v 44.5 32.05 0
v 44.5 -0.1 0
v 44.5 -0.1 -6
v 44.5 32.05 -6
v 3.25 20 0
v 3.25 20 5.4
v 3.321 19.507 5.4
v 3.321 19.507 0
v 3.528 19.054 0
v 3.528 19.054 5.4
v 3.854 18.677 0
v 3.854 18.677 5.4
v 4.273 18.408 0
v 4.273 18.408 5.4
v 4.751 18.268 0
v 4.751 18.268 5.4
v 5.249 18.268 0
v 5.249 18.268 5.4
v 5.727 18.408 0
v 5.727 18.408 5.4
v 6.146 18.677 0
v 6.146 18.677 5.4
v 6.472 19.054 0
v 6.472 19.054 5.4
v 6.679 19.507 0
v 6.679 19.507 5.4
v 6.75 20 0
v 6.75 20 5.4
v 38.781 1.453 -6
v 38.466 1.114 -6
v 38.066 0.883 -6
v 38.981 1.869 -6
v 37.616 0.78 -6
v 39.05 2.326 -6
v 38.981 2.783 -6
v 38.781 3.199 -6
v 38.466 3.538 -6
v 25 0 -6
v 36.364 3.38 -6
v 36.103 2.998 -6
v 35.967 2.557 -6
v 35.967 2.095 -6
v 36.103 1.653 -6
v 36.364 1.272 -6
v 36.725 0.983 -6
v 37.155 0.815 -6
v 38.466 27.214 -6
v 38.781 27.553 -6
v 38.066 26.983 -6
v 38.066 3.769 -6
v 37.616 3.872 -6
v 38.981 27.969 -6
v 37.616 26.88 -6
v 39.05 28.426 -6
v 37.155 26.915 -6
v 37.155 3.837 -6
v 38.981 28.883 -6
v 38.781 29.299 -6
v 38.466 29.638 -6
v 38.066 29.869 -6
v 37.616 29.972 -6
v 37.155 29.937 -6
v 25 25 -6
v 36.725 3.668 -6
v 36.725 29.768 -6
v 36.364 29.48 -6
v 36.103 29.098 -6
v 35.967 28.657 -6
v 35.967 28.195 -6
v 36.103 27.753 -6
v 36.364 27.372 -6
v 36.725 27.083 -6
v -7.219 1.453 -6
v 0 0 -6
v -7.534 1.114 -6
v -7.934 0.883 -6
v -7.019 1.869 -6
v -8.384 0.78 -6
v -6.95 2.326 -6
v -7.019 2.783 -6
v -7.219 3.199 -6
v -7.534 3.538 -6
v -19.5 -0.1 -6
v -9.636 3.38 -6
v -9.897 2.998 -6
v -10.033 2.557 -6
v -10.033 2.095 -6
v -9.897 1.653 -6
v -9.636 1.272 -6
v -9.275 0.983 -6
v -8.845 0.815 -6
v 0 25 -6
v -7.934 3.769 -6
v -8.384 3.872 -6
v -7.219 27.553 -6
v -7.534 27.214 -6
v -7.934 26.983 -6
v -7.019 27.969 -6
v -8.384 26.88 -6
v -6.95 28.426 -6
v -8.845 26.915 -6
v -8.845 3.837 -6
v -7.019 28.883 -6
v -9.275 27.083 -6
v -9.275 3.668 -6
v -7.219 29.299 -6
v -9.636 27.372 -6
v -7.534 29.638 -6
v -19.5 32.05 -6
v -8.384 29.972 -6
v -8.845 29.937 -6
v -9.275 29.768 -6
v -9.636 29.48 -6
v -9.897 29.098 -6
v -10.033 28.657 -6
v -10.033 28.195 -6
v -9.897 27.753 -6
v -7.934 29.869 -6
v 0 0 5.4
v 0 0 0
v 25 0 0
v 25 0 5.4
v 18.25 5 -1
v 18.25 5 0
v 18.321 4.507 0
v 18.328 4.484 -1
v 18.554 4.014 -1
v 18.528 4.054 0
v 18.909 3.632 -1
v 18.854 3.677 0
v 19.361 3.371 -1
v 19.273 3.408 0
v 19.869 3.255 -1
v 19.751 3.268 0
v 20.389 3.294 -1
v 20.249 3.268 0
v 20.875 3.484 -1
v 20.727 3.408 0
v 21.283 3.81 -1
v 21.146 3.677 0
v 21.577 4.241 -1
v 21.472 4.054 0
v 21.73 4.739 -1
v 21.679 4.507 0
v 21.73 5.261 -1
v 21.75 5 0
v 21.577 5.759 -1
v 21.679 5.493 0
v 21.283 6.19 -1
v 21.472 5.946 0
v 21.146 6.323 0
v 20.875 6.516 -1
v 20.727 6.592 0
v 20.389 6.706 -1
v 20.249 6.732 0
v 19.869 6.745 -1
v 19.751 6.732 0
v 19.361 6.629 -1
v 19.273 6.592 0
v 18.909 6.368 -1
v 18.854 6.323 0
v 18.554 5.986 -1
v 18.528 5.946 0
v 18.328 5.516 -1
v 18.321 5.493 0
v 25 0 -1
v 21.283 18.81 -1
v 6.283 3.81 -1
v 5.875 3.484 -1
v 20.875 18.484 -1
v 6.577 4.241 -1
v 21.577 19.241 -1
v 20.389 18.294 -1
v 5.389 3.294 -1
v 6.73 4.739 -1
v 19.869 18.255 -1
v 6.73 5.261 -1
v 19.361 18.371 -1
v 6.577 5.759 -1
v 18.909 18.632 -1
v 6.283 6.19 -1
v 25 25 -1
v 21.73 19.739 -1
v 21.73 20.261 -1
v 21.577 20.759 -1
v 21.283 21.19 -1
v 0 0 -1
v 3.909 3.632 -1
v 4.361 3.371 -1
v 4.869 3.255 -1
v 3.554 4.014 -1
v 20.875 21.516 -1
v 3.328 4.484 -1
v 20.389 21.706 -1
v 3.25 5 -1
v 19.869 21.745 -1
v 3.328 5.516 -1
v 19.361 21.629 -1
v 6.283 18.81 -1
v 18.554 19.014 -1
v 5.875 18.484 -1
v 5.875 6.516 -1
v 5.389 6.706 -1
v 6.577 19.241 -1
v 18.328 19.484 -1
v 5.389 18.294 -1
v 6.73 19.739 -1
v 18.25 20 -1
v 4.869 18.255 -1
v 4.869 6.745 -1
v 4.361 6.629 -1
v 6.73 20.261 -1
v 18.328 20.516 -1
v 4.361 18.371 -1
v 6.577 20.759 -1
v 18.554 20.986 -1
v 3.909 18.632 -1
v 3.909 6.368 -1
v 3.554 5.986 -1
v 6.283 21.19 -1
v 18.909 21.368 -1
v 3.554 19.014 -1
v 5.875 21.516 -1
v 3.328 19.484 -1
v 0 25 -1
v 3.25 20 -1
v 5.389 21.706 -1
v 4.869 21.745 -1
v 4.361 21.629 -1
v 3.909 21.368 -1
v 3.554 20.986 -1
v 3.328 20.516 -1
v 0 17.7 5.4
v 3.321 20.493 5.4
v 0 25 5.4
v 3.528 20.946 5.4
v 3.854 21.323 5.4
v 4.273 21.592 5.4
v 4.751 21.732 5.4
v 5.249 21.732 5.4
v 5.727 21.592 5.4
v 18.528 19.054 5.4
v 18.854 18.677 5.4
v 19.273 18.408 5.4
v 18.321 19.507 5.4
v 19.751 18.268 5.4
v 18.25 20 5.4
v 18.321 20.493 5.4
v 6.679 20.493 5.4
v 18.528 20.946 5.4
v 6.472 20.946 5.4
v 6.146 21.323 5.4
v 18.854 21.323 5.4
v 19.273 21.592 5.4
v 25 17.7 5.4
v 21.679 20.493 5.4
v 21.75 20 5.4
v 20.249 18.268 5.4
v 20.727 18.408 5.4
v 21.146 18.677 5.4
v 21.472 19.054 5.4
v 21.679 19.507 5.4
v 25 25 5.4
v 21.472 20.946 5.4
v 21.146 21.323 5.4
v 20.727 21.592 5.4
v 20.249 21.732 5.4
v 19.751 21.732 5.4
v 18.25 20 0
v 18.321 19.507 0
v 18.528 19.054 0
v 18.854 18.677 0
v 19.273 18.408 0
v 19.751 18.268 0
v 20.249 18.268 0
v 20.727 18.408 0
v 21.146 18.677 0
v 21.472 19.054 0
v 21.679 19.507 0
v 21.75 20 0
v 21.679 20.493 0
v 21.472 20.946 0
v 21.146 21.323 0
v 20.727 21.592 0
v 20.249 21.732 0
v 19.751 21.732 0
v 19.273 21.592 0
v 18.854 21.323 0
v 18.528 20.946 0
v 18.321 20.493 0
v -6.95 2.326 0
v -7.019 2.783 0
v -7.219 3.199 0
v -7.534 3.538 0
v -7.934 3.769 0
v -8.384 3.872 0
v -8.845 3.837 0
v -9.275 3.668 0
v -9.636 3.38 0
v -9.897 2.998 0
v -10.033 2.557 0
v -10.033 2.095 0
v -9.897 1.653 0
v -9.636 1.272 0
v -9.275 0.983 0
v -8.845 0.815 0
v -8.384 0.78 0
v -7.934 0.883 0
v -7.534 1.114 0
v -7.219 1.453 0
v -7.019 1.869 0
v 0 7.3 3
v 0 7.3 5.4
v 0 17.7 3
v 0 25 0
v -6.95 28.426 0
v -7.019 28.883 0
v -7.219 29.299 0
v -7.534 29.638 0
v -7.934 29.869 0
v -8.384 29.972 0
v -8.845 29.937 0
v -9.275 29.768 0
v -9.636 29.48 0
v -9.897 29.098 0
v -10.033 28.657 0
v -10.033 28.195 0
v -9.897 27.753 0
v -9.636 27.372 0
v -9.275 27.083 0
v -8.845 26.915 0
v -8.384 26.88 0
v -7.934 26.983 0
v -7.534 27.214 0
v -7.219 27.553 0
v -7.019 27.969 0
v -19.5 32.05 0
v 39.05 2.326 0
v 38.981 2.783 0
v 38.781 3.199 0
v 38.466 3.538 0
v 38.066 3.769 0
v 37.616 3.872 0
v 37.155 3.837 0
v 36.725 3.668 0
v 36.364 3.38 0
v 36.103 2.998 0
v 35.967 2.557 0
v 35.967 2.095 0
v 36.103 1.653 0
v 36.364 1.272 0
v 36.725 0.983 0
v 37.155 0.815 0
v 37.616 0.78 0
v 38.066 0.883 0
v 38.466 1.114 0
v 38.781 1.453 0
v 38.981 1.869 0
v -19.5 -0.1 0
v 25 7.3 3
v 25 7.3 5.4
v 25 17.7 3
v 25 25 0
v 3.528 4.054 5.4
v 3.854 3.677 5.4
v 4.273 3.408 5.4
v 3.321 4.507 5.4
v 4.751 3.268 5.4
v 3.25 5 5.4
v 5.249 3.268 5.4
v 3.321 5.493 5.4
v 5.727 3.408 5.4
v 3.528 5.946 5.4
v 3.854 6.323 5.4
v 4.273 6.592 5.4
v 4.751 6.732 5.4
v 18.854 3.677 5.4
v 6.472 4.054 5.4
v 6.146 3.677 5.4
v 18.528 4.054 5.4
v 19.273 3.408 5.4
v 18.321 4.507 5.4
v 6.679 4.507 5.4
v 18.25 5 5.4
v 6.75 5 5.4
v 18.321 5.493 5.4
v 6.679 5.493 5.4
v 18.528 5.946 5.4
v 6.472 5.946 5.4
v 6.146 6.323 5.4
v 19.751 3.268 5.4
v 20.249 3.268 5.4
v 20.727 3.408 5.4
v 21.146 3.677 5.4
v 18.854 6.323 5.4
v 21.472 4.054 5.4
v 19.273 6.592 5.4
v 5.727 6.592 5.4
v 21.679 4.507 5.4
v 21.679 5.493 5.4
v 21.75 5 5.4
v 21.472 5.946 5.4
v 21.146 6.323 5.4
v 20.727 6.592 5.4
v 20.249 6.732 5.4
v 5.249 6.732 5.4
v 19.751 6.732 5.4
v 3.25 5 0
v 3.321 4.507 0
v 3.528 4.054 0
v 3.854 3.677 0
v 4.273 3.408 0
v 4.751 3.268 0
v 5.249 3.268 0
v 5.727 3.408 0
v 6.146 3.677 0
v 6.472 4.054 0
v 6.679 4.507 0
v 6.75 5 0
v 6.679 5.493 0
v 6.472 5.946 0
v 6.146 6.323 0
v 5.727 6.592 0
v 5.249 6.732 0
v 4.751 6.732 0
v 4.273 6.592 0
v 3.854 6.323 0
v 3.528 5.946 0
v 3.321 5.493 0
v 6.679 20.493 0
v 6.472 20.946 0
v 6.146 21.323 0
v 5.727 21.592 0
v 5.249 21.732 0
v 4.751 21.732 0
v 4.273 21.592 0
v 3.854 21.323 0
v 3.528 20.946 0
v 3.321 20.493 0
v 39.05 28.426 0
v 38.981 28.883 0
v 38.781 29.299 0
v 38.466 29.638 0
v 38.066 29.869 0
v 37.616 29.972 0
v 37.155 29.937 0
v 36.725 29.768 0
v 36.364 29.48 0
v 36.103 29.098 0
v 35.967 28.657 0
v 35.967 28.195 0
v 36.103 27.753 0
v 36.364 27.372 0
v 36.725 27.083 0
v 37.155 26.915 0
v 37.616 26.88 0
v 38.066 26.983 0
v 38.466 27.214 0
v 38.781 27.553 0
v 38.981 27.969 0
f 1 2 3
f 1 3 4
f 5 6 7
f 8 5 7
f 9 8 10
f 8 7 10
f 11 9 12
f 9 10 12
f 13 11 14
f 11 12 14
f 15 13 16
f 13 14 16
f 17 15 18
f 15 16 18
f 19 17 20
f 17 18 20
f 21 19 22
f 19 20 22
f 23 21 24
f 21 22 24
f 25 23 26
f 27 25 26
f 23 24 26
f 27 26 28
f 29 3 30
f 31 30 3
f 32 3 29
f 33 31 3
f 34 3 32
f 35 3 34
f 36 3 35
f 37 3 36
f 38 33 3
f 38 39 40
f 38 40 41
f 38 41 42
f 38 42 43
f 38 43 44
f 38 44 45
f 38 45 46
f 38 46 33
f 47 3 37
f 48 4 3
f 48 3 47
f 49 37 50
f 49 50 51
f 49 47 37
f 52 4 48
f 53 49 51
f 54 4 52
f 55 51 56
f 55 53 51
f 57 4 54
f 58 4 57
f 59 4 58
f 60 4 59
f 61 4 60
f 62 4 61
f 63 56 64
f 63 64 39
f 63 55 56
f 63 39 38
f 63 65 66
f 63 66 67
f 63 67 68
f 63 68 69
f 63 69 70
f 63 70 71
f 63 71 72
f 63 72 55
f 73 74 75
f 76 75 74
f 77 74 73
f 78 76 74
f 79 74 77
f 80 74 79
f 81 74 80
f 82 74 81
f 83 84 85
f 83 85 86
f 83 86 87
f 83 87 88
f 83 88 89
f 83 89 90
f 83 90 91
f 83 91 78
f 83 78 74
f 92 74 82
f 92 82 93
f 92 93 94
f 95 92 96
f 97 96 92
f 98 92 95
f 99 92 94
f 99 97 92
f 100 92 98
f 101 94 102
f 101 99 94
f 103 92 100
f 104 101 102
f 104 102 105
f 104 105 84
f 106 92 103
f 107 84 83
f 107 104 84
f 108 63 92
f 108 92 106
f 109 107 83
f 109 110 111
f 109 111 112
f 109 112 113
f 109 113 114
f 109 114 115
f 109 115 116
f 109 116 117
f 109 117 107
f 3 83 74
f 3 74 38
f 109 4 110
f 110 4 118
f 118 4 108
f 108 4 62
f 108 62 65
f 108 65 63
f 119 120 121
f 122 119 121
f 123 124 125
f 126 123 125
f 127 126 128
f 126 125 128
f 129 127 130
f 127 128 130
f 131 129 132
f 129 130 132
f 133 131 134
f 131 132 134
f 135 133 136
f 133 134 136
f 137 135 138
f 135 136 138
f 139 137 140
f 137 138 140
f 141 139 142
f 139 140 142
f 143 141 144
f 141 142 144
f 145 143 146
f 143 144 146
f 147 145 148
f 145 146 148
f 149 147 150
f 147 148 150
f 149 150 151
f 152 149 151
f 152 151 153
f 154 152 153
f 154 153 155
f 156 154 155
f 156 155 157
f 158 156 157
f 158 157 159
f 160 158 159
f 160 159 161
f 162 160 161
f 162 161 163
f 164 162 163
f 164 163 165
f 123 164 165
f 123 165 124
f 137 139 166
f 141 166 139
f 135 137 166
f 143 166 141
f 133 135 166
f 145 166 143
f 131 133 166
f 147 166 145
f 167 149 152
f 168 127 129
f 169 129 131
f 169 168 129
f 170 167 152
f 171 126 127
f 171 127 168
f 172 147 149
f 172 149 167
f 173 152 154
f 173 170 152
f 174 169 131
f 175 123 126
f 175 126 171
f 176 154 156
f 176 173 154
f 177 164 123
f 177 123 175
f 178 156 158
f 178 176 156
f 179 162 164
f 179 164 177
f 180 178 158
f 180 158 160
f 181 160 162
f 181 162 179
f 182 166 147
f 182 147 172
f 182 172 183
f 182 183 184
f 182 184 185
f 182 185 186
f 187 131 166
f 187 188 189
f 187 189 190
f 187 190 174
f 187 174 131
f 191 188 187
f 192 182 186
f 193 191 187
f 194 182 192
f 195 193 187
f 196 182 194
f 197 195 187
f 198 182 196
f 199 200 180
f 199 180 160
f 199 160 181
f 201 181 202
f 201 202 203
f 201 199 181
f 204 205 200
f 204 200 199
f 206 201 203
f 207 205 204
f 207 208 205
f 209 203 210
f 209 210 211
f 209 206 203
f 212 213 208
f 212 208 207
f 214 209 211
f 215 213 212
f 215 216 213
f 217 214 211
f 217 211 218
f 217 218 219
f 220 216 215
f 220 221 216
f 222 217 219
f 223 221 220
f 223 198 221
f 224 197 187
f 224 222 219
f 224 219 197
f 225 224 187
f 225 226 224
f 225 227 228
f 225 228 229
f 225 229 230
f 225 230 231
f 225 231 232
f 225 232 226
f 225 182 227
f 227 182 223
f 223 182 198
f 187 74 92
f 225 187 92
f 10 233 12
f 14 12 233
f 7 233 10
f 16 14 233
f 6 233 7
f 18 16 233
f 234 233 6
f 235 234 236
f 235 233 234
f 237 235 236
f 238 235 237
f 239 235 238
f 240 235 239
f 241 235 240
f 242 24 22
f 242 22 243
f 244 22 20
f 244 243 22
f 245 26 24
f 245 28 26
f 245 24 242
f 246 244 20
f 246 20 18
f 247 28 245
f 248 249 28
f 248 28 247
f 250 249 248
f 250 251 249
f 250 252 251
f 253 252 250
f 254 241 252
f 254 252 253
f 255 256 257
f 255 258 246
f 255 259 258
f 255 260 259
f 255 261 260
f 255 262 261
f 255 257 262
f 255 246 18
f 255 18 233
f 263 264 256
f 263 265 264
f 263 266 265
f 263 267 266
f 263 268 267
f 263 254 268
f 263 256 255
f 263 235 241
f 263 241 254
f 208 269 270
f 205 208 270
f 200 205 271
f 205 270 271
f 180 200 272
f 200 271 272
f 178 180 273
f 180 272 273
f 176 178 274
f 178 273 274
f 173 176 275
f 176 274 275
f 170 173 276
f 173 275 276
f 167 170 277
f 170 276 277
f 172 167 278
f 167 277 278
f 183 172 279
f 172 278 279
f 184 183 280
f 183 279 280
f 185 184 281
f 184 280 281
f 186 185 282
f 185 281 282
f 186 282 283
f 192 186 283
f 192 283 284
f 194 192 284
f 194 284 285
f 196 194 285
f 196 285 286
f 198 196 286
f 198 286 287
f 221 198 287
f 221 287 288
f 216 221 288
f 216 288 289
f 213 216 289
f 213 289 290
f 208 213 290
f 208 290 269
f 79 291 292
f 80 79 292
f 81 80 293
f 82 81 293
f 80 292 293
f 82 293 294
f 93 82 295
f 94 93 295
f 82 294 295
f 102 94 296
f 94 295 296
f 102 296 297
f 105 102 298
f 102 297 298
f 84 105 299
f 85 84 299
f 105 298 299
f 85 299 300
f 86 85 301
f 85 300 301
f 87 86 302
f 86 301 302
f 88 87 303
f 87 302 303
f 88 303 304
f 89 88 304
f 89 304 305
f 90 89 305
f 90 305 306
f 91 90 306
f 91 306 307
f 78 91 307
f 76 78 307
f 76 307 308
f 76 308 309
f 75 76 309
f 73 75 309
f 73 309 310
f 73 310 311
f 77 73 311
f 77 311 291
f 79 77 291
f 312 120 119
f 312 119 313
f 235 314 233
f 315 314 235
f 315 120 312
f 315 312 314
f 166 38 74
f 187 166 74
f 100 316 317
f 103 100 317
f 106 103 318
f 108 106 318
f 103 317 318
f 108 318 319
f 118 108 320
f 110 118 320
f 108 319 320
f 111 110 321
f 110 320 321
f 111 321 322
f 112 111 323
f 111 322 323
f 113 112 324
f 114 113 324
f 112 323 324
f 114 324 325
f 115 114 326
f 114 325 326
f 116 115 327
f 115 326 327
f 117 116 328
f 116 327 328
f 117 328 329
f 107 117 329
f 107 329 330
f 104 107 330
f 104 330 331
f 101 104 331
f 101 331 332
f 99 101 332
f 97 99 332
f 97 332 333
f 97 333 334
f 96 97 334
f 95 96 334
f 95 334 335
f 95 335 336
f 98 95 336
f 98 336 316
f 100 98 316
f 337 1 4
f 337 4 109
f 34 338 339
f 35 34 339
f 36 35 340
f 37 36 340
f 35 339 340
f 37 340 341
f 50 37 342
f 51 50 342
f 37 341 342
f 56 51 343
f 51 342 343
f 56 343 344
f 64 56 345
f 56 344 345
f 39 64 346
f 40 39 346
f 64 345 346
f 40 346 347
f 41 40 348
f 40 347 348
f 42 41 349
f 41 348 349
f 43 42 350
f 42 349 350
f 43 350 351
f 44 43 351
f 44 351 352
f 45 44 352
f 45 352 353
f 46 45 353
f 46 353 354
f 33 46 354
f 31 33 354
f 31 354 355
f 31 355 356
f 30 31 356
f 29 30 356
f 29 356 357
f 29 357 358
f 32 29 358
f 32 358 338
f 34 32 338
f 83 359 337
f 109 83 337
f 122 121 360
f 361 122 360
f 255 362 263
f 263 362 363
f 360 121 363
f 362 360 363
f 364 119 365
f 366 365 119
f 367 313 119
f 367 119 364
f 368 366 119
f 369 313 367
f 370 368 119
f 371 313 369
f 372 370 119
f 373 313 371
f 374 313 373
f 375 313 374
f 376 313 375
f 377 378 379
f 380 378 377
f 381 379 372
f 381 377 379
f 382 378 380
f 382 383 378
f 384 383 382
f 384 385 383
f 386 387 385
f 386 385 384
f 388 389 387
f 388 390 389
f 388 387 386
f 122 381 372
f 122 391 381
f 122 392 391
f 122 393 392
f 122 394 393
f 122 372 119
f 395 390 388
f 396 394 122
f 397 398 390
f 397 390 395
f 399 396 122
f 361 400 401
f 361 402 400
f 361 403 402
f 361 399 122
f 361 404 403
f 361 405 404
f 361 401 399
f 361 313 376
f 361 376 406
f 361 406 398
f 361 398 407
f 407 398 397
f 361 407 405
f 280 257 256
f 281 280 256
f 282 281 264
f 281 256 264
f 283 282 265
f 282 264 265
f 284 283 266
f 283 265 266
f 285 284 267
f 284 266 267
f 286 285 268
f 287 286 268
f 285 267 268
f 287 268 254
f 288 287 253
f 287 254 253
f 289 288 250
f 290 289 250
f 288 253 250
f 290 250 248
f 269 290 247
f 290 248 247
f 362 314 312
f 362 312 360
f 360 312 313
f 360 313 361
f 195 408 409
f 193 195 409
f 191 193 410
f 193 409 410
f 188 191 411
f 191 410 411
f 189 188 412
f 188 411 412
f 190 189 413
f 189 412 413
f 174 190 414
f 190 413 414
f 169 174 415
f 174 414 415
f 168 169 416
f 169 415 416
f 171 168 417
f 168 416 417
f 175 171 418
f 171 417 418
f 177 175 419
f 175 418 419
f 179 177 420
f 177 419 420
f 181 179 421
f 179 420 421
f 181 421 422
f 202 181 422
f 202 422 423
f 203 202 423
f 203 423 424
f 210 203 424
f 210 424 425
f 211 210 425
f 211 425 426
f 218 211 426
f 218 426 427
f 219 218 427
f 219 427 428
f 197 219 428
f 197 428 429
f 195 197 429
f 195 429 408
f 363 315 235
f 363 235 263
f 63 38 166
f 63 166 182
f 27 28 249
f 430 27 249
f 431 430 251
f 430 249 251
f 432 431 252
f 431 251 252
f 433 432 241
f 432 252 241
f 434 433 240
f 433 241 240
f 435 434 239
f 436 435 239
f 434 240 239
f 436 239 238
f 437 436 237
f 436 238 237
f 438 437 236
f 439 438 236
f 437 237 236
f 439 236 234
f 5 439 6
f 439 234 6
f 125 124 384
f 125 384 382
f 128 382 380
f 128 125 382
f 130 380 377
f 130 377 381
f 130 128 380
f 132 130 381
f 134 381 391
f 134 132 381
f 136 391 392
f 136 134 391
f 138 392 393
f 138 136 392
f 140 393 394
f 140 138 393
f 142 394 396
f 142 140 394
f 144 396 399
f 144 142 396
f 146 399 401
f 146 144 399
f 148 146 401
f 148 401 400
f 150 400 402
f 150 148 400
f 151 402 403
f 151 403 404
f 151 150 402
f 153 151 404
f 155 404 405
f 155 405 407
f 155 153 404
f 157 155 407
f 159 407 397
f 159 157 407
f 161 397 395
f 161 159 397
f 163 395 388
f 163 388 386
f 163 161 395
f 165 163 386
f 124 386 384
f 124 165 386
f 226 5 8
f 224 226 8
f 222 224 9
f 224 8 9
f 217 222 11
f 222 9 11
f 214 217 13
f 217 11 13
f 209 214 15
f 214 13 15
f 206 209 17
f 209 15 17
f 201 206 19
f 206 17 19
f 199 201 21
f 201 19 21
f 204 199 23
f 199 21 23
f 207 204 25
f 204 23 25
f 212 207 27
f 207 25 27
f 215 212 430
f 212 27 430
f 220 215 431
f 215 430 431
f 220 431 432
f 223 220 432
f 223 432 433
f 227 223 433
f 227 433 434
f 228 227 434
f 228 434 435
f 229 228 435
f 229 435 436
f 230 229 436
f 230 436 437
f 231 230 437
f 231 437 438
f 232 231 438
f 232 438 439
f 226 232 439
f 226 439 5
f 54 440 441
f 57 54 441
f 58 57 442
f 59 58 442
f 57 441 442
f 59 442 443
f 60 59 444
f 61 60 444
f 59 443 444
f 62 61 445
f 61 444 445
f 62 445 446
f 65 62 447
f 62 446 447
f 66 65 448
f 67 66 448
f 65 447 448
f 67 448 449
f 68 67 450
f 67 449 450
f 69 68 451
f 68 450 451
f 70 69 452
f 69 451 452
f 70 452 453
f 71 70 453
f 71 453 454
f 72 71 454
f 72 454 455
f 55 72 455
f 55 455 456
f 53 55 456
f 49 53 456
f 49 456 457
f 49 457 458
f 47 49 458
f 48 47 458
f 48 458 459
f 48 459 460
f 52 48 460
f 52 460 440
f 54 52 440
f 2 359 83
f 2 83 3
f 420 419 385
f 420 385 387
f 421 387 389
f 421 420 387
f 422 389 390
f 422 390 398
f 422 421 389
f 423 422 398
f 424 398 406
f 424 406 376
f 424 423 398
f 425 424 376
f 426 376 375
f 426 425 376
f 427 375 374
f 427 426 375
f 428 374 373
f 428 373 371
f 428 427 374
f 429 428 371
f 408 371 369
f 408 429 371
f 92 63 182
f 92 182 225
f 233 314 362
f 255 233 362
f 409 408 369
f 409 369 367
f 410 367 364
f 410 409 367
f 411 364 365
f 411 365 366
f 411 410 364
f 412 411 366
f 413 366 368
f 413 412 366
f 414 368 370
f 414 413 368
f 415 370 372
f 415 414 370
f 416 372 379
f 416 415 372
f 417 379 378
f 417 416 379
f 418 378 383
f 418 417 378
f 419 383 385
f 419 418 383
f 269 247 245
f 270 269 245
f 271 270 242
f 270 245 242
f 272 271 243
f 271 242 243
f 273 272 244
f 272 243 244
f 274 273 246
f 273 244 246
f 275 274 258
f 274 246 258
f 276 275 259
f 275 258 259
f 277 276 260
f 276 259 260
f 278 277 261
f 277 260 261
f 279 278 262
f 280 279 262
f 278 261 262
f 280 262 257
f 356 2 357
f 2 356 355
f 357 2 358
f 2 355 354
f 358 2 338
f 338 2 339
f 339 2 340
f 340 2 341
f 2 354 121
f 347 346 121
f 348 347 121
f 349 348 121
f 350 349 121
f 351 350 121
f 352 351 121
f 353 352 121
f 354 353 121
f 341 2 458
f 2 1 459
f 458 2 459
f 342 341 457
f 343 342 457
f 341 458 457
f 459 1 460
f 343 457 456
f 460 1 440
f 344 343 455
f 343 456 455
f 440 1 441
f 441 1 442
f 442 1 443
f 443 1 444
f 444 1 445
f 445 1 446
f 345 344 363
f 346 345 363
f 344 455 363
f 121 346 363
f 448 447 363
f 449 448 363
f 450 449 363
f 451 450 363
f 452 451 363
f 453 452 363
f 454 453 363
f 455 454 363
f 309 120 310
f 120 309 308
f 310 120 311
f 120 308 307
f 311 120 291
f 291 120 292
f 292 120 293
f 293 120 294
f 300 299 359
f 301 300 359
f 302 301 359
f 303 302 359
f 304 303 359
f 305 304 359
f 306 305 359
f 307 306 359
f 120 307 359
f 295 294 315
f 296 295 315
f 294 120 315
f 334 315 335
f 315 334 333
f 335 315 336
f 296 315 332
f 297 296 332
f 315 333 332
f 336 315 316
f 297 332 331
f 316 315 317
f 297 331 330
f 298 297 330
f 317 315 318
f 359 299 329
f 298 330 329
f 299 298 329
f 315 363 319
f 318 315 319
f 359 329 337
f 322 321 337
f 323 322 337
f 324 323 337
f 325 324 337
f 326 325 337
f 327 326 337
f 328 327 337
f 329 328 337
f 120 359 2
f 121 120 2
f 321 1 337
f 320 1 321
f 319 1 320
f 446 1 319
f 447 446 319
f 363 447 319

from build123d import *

# Parameters (mm, degrees)
SKETCH_1_W          = 25
SKETCH_1_H          = 25
SKETCH_1_R          = 1.75
EXTRUDE_1_DEPTH     = 3
SKETCH_2_W          = 25
SKETCH_2_H          = 7.3
EXTRUDE_2_DEPTH     = 2.4
SKETCH_3_R          = 1.75
CUT_EXTRUDE_1_DEPTH = 36.765346356
SKETCH_6_W          = 64
SKETCH_6_H          = 36.1
EXTRUDE_5_DEPTH     = 6
SKETCH_7_W          = 25
SKETCH_7_H          = 25
CUT_EXTRUDE_2_DEPTH = 5
SKETCH_8_R          = 1.55
CUT_EXTRUDE_3_DEPTH = 36
SKETCH_3_2_R        = 1.75
CUT_EXTRUDE_5_DEPTH = 57.012610187
SKETCH_9_W          = 64
SKETCH_9_H          = 3.95
CUT_EXTRUDE_6_DEPTH = 56.167494959


with BuildPart() as part:
    # 草图1 → 凸台-拉伸1 (new body)
    with BuildSketch(Plane.XY):
        with Locations((12.5, 12.5)):
            Rectangle(SKETCH_1_W, SKETCH_1_H)
        with Locations((5, 20)):
            Circle(SKETCH_1_R, mode=Mode.SUBTRACT)
        with Locations((20, 20)):
            Circle(SKETCH_1_R, mode=Mode.SUBTRACT)
        with Locations((5, 5)):
            Circle(SKETCH_1_R, mode=Mode.SUBTRACT)
        with Locations((20, 5)):
            Circle(SKETCH_1_R, mode=Mode.SUBTRACT)
    extrude(amount=EXTRUDE_1_DEPTH)

    # 草图2 → 凸台-拉伸2 (add)
    with BuildSketch(Plane.XY.offset(3)):
        with Locations((12.5, 21.35)):
            Rectangle(SKETCH_2_W, SKETCH_2_H)
        with Locations((12.5, 3.65)):
            Rectangle(SKETCH_2_W, SKETCH_2_H)
    extrude(amount=EXTRUDE_2_DEPTH)

    # 草图3 → 切除-拉伸1 (cut, through all)
    with BuildSketch(Plane.XY.offset(5.4)):
        with Locations((5, 5)):
            Circle(SKETCH_3_R)
        with Locations((20, 5)):
            Circle(SKETCH_3_R)
        with Locations((20, 20)):
            Circle(SKETCH_3_R)
        with Locations((5, 20)):
            Circle(SKETCH_3_R)
    extrude(amount=-CUT_EXTRUDE_1_DEPTH, mode=Mode.SUBTRACT)

    # 草图6 → 凸台-拉伸5 (add)
    with BuildSketch(Plane(origin=(0, 0, 0), x_dir=(-1, 0, 0), z_dir=(0, 0, -1))):
        with Locations((-12.5, 14)):
            Rectangle(SKETCH_6_W, SKETCH_6_H)
    extrude(amount=EXTRUDE_5_DEPTH)

    # 草图7 → 切除-拉伸2 (cut)
    with BuildSketch(Plane(origin=(0, 0, -6), x_dir=(-1, 0, 0), z_dir=(0, 0, -1))):
        with Locations((-12.5, 12.5)):
            Rectangle(SKETCH_7_W, SKETCH_7_H)
    extrude(amount=-CUT_EXTRUDE_2_DEPTH, mode=Mode.SUBTRACT)

    # 草图8 → 切除-拉伸3 (cut)
    with BuildSketch(Plane.XY):
        with Locations((37.5, 2.325837481)):
            Circle(SKETCH_8_R)
        with Locations((-8.5, 2.325837481)):
            Circle(SKETCH_8_R)
        with Locations((-8.5, 28.425837481)):
            Circle(SKETCH_8_R)
        with Locations((37.5, 28.425837481)):
            Circle(SKETCH_8_R)
    extrude(amount=-CUT_EXTRUDE_3_DEPTH, mode=Mode.SUBTRACT)

    # 草图3<2> → 切除-拉伸5 (cut, through all)
    with BuildSketch(Plane.XY.offset(5.4)):
        with Locations((5, 5)):
            Circle(SKETCH_3_2_R)
        with Locations((20, 5)):
            Circle(SKETCH_3_2_R)
        with Locations((20, 20)):
            Circle(SKETCH_3_2_R)
        with Locations((5, 20)):
            Circle(SKETCH_3_2_R)
    extrude(amount=-CUT_EXTRUDE_5_DEPTH, mode=Mode.SUBTRACT)

    # 草图9 → 切除-拉伸6 (cut, through all)
    with BuildSketch(Plane.XY):
        with Locations((12.5, -2.075)):
            Rectangle(SKETCH_9_W, SKETCH_9_H)
    extrude(amount=-CUT_EXTRUDE_6_DEPTH, mode=Mode.SUBTRACT)


solid = part.part
